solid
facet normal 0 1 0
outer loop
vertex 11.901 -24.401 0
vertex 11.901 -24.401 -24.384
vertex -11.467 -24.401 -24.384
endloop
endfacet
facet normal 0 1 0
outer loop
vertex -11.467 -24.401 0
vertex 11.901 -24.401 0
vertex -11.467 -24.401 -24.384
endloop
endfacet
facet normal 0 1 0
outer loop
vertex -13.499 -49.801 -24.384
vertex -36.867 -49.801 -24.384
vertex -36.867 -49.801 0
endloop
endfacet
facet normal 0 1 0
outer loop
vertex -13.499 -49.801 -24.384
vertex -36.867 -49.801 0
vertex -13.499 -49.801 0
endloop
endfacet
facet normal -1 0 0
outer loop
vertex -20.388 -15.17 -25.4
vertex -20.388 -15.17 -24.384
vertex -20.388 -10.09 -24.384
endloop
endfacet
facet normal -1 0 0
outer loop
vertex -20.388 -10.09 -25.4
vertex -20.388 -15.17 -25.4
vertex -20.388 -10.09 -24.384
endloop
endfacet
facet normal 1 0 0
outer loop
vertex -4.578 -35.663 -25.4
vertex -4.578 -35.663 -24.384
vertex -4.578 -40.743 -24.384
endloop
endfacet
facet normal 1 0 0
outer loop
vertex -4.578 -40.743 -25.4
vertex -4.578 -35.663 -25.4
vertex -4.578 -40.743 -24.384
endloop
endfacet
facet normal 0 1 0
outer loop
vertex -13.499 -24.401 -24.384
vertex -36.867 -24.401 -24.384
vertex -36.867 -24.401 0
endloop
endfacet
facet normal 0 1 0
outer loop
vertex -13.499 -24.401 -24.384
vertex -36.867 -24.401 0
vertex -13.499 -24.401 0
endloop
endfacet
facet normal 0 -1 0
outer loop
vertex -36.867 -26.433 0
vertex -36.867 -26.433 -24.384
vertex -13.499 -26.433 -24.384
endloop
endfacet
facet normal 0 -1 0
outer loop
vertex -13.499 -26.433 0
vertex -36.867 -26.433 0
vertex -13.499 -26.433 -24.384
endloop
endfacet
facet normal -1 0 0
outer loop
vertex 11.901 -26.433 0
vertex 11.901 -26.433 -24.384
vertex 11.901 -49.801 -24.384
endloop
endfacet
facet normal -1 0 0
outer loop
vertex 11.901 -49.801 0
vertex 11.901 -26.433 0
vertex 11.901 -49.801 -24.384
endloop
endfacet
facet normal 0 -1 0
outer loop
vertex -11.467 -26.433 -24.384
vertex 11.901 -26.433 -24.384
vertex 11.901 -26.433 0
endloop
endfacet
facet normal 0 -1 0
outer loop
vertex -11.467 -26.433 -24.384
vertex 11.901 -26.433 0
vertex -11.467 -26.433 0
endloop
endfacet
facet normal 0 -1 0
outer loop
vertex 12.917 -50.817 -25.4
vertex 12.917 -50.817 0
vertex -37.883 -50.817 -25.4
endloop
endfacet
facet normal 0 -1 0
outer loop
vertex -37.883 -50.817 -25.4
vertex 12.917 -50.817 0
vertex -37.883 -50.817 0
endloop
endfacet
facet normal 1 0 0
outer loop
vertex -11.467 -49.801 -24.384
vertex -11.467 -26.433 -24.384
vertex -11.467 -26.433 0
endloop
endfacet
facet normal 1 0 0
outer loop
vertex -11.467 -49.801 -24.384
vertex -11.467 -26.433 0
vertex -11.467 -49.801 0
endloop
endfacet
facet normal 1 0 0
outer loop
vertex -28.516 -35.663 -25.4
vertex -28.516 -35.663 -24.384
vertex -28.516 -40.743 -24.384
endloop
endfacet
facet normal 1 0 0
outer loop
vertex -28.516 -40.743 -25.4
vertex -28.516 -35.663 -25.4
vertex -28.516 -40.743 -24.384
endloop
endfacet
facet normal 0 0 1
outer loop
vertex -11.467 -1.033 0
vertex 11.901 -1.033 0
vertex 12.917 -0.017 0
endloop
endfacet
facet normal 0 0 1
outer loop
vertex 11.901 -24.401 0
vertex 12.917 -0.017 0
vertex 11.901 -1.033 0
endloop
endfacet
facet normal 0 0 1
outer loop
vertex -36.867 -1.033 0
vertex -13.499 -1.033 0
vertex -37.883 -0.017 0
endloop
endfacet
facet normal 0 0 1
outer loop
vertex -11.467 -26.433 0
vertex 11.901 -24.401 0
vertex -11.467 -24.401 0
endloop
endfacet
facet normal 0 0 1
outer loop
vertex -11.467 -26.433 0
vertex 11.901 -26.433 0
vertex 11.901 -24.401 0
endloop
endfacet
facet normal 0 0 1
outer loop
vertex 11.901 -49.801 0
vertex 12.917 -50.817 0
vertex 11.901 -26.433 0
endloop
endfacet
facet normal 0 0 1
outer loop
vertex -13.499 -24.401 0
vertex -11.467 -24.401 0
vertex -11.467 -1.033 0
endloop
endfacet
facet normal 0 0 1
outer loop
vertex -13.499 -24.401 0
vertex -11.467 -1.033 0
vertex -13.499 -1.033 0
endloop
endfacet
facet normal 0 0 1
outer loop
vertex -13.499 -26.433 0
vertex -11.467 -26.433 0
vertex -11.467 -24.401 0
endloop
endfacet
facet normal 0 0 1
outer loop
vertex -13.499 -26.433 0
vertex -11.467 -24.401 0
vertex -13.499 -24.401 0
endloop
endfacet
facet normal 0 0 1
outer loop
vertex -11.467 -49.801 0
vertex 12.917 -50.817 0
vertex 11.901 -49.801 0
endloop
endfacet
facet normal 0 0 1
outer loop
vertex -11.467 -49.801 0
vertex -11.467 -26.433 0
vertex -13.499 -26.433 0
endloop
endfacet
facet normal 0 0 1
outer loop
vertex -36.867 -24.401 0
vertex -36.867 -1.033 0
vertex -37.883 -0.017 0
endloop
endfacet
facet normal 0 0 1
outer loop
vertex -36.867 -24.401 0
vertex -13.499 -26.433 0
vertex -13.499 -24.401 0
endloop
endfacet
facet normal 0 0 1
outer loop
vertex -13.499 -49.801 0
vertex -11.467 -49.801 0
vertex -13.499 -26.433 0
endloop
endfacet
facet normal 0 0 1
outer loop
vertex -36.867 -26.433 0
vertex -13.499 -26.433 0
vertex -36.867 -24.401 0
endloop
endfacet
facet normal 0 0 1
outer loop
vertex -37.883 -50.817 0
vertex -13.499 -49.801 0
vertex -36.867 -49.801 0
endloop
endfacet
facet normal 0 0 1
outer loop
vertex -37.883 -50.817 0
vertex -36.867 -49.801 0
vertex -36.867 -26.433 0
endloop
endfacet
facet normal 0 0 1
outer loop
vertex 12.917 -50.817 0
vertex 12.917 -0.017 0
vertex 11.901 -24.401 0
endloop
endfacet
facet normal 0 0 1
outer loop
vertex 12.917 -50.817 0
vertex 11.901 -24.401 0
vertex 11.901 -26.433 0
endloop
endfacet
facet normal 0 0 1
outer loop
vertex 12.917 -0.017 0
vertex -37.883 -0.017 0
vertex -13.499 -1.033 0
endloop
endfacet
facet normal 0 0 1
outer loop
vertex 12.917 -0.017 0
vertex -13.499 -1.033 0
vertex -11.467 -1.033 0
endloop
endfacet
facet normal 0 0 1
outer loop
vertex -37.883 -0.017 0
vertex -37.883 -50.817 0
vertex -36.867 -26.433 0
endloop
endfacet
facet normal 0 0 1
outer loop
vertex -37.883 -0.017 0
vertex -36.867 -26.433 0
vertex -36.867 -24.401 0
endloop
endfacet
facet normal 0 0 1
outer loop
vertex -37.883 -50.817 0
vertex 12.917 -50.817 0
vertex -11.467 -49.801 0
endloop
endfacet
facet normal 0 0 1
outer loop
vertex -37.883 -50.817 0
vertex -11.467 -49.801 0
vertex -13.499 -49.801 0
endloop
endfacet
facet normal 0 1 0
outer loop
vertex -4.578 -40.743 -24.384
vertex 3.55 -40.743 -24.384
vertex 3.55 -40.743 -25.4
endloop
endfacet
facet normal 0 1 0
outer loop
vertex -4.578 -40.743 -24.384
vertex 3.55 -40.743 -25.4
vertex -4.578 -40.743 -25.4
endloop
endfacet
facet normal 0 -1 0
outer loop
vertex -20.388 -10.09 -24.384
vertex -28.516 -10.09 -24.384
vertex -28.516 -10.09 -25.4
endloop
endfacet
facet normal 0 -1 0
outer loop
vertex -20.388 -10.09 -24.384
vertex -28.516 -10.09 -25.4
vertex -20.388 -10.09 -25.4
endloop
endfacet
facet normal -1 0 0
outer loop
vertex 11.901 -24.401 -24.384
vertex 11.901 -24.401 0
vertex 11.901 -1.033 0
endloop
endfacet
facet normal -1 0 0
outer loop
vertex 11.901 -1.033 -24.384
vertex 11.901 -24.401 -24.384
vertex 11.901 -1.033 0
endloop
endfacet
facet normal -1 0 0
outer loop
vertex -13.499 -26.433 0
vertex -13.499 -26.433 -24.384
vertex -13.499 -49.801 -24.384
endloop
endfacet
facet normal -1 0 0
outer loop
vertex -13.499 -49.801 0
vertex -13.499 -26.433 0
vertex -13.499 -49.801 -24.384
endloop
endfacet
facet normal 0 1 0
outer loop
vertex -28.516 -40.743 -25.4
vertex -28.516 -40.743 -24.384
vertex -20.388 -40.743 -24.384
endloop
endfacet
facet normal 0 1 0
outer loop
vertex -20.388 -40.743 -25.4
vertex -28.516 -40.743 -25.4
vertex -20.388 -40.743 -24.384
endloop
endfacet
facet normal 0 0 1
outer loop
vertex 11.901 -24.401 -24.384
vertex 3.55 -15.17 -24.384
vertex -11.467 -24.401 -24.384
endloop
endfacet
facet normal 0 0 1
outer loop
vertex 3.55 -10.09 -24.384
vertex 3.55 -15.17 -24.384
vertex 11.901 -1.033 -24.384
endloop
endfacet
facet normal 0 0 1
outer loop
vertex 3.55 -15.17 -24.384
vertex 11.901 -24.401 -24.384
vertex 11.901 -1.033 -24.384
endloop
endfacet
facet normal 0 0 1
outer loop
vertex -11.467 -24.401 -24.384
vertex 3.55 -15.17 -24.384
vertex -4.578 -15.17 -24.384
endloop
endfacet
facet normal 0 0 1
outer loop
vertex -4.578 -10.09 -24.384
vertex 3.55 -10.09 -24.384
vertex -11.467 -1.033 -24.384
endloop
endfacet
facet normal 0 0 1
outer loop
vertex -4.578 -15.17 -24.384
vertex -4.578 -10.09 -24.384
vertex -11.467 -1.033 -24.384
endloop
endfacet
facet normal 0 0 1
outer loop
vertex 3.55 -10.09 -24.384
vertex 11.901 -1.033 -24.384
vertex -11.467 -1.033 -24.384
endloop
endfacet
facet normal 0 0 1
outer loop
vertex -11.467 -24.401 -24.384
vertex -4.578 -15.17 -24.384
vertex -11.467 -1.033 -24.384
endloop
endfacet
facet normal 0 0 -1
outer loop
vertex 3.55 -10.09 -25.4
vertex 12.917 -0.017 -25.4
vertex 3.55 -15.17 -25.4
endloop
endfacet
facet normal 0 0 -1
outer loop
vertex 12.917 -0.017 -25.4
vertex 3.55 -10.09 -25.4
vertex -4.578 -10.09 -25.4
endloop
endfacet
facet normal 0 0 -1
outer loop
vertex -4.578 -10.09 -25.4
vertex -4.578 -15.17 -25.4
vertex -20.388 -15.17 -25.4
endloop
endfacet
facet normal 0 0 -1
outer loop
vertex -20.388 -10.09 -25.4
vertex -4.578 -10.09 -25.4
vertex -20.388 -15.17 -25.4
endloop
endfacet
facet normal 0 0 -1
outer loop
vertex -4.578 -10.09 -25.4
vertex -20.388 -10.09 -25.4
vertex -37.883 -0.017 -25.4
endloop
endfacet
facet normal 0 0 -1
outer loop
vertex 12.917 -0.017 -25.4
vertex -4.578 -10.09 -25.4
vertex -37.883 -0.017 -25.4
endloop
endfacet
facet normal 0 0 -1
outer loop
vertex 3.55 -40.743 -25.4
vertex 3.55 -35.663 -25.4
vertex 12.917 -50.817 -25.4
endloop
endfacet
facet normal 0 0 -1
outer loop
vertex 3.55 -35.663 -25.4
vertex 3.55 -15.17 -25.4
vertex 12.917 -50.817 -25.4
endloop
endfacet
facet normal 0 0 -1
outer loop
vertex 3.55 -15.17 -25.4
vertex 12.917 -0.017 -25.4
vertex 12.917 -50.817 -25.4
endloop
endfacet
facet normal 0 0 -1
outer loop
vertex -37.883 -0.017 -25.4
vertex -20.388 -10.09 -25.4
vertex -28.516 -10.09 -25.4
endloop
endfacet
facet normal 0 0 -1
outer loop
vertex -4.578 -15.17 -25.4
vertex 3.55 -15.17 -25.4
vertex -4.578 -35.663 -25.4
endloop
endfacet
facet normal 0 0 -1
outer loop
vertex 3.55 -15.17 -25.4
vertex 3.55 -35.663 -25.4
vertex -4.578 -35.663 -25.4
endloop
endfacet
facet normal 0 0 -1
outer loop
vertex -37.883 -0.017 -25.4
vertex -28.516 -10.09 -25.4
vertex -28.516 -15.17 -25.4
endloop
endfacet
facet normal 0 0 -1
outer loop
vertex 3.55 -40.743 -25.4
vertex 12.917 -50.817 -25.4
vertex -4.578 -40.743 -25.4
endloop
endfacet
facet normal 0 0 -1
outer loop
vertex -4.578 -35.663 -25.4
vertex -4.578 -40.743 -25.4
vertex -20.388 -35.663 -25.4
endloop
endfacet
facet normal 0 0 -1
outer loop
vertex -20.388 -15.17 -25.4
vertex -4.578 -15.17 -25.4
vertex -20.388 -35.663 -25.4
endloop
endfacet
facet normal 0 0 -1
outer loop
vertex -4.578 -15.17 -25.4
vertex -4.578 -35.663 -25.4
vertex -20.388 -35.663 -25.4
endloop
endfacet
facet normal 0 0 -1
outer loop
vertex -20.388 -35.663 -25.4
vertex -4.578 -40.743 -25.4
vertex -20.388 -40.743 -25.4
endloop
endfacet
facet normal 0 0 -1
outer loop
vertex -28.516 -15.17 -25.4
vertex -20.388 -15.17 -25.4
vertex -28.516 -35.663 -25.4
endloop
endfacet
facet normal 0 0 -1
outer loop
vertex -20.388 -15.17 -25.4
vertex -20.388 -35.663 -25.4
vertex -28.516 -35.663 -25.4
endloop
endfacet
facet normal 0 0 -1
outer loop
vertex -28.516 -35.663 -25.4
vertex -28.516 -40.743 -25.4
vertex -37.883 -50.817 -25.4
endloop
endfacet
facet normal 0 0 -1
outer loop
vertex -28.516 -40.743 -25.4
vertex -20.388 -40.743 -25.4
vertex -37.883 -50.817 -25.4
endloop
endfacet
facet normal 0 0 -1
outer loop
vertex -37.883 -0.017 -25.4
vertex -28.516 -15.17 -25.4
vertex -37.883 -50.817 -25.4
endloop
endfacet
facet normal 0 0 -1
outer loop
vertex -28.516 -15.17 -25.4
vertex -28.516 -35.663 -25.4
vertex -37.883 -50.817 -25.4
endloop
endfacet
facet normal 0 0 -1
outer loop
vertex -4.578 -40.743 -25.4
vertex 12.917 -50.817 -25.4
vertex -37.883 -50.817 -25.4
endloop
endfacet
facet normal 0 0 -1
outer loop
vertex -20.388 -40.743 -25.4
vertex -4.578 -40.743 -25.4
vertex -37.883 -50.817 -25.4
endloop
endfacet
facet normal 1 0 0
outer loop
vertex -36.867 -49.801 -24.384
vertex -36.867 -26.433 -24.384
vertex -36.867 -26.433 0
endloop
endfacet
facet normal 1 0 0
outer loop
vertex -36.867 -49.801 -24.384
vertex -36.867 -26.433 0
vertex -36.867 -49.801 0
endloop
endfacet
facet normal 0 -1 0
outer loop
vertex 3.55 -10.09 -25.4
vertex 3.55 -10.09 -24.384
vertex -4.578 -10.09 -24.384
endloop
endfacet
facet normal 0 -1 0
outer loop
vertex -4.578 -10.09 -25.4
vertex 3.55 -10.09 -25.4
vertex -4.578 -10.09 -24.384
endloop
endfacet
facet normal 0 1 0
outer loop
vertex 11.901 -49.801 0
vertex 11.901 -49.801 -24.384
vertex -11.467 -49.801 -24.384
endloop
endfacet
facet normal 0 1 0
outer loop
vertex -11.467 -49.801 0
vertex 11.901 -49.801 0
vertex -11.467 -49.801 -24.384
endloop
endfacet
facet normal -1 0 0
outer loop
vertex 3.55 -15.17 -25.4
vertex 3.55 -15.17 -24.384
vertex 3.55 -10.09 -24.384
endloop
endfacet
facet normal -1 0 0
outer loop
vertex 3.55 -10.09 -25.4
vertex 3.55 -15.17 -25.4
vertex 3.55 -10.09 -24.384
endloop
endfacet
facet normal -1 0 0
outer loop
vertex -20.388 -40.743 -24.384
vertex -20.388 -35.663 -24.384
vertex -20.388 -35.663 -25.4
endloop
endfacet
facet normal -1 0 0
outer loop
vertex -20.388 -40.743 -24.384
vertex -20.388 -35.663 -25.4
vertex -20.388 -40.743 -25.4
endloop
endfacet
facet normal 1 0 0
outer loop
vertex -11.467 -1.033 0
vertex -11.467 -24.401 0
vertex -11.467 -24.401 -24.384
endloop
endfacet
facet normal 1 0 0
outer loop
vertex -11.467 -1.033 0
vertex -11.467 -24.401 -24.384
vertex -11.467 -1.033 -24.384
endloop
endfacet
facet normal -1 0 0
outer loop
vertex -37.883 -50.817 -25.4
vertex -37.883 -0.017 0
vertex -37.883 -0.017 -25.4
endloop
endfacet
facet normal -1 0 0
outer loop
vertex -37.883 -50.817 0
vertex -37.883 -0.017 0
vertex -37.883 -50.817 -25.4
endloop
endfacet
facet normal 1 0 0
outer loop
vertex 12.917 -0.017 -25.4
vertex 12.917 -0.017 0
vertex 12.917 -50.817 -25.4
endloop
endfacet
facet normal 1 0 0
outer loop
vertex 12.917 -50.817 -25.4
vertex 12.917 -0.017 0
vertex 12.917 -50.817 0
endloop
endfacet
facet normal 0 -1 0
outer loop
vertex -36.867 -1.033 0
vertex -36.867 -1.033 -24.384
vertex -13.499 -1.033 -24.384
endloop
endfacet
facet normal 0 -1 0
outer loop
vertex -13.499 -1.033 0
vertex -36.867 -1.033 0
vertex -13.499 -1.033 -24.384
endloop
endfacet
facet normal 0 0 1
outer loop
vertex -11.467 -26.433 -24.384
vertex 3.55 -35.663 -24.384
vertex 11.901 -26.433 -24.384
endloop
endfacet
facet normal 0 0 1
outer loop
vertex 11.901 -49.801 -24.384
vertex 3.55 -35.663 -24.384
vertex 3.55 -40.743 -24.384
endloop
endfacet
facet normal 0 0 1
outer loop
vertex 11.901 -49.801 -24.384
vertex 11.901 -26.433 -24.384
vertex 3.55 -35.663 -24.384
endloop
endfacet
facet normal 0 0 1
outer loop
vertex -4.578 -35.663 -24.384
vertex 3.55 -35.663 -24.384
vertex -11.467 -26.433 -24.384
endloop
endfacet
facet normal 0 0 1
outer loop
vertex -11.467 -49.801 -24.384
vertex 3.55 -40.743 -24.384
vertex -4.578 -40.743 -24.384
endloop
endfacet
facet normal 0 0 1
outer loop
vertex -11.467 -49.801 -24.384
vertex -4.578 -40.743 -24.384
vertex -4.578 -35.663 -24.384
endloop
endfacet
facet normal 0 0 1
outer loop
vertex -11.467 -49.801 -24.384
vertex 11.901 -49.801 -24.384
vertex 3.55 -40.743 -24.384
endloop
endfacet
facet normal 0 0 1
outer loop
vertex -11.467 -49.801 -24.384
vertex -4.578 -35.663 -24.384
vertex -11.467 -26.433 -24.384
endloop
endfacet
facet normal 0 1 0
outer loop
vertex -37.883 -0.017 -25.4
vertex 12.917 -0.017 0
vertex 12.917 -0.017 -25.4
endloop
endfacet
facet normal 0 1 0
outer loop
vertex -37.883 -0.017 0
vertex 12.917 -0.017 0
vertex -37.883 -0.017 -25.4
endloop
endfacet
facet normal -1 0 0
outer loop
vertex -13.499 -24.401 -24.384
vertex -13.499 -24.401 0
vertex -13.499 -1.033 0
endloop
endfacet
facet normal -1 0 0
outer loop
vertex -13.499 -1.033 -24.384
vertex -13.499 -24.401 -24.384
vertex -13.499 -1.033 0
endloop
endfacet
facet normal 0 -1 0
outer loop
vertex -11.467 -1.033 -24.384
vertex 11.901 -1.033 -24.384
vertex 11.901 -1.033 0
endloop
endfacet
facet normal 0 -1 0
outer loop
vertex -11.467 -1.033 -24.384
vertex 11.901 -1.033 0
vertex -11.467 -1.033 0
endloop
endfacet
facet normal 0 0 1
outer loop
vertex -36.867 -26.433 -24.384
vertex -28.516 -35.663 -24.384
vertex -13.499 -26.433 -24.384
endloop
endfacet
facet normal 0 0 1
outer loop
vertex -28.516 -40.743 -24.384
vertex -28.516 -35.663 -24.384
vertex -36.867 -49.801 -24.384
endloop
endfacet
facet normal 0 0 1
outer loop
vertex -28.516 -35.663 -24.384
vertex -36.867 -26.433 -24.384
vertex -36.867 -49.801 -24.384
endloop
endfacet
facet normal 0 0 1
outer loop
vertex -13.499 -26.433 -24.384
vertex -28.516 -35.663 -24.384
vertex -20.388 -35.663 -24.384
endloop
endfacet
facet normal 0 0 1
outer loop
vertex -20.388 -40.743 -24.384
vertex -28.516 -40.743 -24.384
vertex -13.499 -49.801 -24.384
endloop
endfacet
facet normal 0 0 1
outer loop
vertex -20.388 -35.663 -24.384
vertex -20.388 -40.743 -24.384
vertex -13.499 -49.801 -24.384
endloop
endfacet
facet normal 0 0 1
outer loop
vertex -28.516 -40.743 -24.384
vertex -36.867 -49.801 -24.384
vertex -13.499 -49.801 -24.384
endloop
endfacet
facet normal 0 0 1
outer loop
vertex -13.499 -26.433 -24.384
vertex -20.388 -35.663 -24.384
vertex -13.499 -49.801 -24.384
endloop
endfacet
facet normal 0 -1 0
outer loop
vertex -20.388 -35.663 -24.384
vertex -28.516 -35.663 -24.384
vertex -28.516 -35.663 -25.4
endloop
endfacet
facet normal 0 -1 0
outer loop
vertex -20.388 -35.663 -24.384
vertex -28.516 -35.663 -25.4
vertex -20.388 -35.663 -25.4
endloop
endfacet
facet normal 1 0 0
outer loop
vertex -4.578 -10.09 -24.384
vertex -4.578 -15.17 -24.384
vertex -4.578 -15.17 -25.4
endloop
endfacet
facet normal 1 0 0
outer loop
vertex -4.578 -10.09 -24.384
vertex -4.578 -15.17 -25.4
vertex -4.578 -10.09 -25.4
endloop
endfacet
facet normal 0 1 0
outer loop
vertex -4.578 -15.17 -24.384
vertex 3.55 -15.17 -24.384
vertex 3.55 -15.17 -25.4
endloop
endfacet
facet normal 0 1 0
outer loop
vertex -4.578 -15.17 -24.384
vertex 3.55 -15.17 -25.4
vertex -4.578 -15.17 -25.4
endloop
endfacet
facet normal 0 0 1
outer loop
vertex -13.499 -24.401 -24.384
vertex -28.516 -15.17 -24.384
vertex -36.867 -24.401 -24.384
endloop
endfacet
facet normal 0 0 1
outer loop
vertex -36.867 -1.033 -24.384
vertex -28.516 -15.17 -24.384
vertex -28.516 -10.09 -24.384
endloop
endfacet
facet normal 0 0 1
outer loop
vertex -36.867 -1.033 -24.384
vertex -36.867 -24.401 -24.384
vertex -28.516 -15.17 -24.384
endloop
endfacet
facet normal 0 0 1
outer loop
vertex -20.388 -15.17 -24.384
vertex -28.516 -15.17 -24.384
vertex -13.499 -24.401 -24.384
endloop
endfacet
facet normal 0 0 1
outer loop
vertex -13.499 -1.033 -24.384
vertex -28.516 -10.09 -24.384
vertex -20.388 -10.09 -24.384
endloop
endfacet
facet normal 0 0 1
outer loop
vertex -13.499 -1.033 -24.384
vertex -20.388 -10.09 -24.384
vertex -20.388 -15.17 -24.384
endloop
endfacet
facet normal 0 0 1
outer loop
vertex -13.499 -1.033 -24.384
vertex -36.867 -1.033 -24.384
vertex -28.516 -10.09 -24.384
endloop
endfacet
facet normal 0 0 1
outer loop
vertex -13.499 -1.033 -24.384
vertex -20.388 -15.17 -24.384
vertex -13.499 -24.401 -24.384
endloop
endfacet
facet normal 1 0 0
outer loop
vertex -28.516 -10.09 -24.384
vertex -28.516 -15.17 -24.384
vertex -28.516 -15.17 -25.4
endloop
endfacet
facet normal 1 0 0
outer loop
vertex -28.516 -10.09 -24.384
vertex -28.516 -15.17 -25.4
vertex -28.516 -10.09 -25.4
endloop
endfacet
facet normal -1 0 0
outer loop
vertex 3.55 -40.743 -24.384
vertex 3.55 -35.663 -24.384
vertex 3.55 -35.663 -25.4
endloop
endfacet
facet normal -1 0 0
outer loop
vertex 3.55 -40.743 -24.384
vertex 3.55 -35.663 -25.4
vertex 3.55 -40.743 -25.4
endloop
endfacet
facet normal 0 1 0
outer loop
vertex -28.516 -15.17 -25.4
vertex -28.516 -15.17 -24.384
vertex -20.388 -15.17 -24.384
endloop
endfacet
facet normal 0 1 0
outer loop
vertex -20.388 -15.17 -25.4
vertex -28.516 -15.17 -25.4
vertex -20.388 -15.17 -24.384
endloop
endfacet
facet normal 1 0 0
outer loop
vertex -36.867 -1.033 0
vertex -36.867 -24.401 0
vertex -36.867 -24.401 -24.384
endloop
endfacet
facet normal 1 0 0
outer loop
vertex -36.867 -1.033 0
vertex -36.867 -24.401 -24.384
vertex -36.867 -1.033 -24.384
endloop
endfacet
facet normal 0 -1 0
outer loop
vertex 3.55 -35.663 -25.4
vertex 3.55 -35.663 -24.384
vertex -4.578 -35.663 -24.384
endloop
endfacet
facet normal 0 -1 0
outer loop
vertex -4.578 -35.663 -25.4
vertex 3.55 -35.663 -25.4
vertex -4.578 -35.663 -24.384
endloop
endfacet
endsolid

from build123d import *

# Parameters (mm, degrees)
F0_W     = 25.4
F0_H     = 25.4
F1_DEPTH = 25.4
F2_T     = -1.016
F3_W     = 8.128
F3_H     = 5.08
F4_DEPTH = 25.4


with BuildPart() as f1:
    # F0 (on Top) → F1 (new body)
    with BuildSketch(Plane.XY):
        with Locations((-25.182763, -12.716711)):
            Rectangle(F0_W, F0_H)
    extrude(amount=-F1_DEPTH)

    # F2
    f2_openings = [f1.faces().sort_by_distance(p)[0] for p in [
        (-25.182763, -12.716711, 0),
    ]]
    offset(amount=F2_T, openings=f2_openings)

    # F3 (on Top) → F4 (cut)
    with BuildSketch(Plane.XY):
        with Locations((-24.451679, -12.630123)):
            Rectangle(F3_W, F3_H)
    extrude(amount=-F4_DEPTH, mode=Mode.SUBTRACT)

    # F5: F1 across face


with BuildPart() as f1_1:
    add(f1.part)
    add(f1.part.mirror(Plane(origin=(-12.482763, -12.716711, -12.7), x_dir=(0, 1, 0), z_dir=(1, 0, 0))))

    # F6: F1 across face


with BuildPart() as f1_2:
    add(f1_1.part)
    add(f1_1.part.mirror(Plane(origin=(-12.482763, -25.416711, -12.7), x_dir=(1, 0, 0), z_dir=(0, -1, 0))))


solid = f1_2.part
